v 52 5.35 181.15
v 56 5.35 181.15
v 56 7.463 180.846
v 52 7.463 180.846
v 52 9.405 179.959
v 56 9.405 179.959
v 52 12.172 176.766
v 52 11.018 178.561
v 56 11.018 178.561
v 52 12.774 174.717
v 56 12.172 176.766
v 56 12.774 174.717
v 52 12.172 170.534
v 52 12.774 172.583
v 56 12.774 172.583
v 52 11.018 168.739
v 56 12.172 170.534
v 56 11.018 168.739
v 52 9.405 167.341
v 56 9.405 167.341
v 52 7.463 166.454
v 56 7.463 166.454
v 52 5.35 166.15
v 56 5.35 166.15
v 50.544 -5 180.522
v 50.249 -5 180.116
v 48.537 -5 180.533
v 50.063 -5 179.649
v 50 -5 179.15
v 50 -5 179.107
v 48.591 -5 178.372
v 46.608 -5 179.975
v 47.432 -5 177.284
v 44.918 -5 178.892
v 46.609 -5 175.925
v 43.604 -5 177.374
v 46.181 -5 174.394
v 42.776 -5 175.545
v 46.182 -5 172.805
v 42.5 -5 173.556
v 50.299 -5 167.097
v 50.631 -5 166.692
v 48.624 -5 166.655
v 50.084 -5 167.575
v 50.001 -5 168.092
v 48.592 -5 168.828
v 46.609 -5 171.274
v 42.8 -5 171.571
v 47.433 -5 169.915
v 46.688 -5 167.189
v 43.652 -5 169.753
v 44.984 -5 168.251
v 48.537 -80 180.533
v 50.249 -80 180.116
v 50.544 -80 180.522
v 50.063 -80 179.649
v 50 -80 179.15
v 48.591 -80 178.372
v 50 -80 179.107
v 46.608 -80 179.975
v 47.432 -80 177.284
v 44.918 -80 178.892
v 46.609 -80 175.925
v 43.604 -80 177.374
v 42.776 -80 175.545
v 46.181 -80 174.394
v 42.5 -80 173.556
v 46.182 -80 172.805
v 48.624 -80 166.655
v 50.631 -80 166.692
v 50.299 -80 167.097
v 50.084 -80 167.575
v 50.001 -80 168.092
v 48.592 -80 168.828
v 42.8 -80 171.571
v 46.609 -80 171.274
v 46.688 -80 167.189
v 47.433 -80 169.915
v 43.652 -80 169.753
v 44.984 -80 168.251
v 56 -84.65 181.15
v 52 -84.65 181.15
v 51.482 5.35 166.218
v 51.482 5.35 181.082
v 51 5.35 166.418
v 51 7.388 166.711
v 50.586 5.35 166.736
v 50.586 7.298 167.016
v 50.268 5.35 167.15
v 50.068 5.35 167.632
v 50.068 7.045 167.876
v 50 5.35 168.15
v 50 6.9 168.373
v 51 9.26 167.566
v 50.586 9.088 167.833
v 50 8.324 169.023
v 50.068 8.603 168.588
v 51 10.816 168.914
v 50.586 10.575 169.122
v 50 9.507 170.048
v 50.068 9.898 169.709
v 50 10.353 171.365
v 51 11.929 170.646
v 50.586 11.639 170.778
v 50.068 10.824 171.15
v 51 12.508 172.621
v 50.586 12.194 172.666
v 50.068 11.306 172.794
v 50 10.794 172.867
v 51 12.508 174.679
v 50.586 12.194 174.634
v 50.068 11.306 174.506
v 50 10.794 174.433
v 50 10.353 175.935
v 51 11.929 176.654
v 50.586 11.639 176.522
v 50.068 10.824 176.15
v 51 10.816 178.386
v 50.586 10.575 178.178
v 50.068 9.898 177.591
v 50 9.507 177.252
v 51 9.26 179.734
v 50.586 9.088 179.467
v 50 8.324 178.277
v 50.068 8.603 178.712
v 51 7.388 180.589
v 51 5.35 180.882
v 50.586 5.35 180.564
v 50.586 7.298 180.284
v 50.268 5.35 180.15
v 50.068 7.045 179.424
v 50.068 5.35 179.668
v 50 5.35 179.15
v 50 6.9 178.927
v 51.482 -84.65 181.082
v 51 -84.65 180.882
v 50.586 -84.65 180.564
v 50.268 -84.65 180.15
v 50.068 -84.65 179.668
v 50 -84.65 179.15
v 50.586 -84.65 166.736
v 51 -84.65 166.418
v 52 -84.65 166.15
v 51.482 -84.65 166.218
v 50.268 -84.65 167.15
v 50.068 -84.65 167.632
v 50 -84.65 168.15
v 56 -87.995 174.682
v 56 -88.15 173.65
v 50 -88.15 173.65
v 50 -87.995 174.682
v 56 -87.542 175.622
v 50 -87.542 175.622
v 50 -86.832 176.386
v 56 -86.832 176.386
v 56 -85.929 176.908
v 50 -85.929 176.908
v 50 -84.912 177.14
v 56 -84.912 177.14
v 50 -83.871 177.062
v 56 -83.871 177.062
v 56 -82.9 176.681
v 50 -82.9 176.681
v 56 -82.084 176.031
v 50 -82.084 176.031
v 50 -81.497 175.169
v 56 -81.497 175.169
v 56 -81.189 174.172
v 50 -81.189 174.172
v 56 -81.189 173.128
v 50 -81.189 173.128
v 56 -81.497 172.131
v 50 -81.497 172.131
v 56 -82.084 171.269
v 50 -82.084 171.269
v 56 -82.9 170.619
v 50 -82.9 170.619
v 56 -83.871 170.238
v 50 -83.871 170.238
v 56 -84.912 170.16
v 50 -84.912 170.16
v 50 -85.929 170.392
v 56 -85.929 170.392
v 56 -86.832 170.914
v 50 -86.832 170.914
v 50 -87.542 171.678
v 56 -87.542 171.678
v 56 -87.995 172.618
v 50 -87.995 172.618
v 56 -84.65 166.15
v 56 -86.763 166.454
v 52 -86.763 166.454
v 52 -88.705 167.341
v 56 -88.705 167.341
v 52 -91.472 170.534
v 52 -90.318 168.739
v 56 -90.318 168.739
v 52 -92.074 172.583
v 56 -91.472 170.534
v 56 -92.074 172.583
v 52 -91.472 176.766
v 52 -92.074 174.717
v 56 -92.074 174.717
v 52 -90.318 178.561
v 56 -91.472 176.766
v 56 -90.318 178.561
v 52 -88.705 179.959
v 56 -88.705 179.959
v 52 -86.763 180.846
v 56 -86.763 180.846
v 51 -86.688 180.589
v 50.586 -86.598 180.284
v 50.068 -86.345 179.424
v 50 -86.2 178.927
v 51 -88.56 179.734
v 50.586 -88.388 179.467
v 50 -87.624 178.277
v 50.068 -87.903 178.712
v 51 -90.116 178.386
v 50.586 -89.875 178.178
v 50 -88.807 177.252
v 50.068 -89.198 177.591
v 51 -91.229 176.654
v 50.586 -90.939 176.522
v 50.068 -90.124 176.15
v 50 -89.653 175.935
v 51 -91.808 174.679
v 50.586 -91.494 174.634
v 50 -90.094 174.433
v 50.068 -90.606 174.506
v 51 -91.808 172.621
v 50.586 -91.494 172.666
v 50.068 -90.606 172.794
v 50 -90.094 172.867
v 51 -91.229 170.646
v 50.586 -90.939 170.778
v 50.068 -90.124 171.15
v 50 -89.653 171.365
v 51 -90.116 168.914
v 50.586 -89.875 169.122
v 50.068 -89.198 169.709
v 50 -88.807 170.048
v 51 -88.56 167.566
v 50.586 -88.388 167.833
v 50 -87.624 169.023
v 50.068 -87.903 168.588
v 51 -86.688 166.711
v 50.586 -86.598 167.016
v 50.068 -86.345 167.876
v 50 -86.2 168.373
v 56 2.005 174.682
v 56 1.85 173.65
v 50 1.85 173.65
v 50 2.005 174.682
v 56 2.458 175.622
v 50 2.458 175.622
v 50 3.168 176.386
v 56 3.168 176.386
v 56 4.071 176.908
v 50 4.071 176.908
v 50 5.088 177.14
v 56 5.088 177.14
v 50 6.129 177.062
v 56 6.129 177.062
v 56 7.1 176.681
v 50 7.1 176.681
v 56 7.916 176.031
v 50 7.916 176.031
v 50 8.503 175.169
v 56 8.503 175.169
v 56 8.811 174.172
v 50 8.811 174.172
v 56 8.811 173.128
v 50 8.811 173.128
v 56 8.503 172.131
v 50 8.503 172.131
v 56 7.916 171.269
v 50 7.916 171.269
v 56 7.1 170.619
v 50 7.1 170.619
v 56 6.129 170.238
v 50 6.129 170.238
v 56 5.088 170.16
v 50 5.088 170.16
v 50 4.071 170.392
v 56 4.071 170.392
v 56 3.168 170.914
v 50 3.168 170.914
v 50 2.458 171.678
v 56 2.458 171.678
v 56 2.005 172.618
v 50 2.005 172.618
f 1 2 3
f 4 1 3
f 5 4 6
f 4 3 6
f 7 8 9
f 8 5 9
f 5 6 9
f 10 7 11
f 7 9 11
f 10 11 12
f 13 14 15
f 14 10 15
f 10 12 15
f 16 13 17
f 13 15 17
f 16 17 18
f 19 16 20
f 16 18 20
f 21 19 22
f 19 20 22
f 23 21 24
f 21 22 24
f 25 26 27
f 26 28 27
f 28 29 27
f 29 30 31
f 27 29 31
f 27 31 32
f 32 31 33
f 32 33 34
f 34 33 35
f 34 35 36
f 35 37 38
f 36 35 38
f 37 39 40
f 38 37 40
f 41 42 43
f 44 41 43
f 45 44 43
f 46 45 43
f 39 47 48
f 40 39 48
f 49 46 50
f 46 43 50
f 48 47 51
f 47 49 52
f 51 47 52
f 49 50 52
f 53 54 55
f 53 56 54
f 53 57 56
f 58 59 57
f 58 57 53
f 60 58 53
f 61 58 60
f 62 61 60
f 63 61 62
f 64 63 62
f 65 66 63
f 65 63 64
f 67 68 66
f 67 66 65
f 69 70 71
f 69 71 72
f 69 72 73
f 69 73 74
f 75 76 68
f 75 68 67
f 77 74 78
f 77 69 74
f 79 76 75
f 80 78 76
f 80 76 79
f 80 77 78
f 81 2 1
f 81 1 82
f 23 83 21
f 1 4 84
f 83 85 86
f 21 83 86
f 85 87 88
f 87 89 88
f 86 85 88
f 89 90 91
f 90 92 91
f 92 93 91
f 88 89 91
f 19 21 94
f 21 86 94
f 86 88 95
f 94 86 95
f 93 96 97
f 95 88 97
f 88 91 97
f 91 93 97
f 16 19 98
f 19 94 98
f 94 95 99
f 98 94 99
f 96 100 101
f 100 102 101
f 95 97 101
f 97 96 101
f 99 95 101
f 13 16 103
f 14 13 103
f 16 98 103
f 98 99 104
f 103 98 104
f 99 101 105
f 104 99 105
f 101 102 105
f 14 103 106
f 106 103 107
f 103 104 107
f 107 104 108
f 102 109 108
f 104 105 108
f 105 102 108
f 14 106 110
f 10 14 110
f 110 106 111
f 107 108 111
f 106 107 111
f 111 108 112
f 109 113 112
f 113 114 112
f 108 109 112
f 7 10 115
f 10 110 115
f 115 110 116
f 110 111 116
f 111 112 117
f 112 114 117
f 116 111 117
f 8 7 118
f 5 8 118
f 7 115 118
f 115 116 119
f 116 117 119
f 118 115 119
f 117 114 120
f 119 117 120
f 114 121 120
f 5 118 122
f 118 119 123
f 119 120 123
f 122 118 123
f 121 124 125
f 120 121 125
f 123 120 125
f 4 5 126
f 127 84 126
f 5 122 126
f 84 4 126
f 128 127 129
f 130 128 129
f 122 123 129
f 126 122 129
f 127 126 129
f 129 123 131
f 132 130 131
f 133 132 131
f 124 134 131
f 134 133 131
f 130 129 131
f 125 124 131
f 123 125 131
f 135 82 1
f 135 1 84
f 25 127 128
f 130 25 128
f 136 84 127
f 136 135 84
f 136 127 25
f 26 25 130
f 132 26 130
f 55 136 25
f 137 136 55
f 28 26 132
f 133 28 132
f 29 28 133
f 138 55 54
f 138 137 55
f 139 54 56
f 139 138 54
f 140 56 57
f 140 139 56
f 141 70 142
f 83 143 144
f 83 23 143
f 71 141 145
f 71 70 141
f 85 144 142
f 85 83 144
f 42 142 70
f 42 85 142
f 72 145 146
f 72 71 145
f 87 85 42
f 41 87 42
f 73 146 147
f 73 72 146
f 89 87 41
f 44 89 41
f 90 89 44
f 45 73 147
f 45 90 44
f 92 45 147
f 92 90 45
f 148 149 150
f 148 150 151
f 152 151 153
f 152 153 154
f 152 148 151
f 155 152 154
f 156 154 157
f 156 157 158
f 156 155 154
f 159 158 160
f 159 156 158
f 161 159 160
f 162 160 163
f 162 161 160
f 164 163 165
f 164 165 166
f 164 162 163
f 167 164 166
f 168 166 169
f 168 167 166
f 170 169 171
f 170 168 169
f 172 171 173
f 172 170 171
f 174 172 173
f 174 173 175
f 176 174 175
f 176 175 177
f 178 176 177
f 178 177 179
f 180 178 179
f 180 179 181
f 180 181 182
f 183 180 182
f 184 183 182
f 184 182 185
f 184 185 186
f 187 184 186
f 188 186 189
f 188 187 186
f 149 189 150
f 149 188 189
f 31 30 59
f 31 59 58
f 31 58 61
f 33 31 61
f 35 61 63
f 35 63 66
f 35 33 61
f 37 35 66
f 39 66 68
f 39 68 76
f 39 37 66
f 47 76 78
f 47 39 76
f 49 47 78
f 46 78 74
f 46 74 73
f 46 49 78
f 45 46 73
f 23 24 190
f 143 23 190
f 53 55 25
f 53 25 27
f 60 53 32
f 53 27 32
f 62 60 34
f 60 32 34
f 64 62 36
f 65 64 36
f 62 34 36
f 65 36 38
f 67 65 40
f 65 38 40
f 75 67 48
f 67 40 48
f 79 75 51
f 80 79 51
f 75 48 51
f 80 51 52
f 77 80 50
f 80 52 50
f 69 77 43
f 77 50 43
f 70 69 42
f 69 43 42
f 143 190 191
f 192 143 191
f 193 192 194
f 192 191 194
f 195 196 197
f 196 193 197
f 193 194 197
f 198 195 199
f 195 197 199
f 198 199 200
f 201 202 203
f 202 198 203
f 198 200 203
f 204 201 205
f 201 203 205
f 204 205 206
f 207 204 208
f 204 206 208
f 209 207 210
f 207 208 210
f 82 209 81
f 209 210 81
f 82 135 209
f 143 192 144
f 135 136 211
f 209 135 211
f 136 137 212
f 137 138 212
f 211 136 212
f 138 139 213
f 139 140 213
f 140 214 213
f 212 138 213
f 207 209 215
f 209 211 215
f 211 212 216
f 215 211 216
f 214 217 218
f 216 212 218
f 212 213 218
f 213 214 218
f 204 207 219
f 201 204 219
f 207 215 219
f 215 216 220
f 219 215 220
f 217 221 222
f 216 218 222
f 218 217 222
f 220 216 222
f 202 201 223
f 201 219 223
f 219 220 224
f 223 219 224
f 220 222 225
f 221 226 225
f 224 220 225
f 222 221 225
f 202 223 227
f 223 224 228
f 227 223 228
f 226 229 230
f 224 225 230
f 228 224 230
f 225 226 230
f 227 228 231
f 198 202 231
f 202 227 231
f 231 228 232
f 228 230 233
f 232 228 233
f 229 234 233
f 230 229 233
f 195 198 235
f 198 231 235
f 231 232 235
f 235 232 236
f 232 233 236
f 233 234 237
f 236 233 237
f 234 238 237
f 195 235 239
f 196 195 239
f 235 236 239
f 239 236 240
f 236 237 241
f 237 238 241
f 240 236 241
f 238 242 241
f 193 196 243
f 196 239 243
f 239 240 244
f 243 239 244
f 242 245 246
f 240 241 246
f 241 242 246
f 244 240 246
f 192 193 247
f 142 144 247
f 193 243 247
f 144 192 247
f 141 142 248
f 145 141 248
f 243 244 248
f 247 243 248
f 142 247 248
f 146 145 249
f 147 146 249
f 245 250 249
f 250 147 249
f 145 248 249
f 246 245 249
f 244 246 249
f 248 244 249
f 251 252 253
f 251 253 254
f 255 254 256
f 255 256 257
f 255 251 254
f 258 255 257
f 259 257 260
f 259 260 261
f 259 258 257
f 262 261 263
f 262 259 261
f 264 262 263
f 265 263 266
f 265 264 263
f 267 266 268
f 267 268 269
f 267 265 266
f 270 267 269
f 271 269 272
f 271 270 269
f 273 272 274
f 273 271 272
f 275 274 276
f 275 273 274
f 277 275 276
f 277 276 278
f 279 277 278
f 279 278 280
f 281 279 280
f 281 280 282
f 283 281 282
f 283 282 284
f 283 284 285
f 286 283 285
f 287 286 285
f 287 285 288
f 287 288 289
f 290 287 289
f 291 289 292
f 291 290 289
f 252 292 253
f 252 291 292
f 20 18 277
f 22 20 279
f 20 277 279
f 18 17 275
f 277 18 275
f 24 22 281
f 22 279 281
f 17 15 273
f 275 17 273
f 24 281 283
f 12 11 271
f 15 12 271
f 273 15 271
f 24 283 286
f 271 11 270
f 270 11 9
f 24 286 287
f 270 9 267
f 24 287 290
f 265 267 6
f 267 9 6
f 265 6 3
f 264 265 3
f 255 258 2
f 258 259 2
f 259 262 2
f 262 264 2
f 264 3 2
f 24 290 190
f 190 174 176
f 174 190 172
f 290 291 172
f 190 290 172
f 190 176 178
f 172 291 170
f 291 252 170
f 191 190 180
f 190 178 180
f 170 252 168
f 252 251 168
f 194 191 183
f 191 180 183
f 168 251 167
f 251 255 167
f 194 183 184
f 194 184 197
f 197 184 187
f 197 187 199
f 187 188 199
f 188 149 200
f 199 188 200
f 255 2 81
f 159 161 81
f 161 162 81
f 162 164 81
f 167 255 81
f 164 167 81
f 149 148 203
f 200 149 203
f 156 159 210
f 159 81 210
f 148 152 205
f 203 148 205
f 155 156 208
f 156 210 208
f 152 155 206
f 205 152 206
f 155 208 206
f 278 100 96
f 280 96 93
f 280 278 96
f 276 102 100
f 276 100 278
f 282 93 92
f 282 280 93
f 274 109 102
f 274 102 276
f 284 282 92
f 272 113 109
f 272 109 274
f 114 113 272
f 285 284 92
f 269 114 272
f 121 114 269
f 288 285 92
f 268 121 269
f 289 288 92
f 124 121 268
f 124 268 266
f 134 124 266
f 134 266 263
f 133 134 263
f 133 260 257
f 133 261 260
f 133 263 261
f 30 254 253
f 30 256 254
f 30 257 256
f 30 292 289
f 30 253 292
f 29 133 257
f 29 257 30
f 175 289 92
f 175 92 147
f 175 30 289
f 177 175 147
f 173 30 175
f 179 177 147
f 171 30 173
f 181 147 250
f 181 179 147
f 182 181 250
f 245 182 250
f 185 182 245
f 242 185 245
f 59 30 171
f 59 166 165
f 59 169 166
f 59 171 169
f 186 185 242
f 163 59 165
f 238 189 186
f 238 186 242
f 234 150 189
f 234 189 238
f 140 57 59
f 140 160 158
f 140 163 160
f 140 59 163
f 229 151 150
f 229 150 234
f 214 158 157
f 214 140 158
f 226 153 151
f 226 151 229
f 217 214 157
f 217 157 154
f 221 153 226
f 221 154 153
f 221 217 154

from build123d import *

# Parameters (mm, degrees)
SKETCH010_R                = 3.5
EXTRUDE009_DEPTH           = 6
FILLET001_R                = 2
EXTRUDE023_DEPTH           = 75
EXTRUDE023_PLACEMENT_ANGLE = 180


with BuildPart() as palo_3_hombro:
    # Sketch010 → Extrude009 (new body)
    with BuildSketch(Plane(origin=(0, 0, 0), x_dir=(0, -1, 0), z_dir=(-1, 0, 0))):
        with BuildLine():
            ThreePointArc((0, 7.5), (-7.5, 0), (0, -7.5))
            Line((0, -7.5), (90, -7.5))
            ThreePointArc((90, -7.5), (97.5, 0), (90, 7.5))
            Line((0, 7.5), (90, 7.5))
        make_face()
        Circle(SKETCH010_R, mode=Mode.SUBTRACT)
        with Locations((90, 0)):
            Circle(SKETCH010_R, mode=Mode.SUBTRACT)
    extrude(amount=EXTRUDE009_DEPTH)


with BuildPart() as palo_3_hombro_1:
    # Extrude009 placement: moved
    add(palo_3_hombro.part.moved(Location((60, 5.35, 173.65))))

    # Fillet001
    fillet001_edges = [palo_3_hombro_1.edges().sort_by_distance(p)[0] for p in [
        (54, -39.65, 181.15),
    ]]
    fillet(fillet001_edges, radius=FILLET001_R)


with BuildPart() as fusion028:
    # Sketch024 → Extrude023 (new body)
    with BuildSketch(Plane.XZ):
        with BuildLine():
            ThreePointArc((-4.21383, -5.589601), (7, 0), (-4.21383, 5.589601))
            ThreePointArc((-4.21383, -5.589601), (3.372719, 0), (-4.21383, 5.589601))
        make_face()
    extrude(amount=EXTRUDE023_DEPTH)


with BuildPart() as fusion028_1:
    # Extrude023 placement: moved
    add(fusion028.part.moved(Location((53.5, -5, 173.6))).rotate(Axis((53.5, -5, 173.6), (0, 1, 0)), EXTRUDE023_PLACEMENT_ANGLE))

    # Fusion028: union palo 3 hombro
    add(palo_3_hombro_1.part)


with BuildPart() as fusion028_2:
    # Fusion028 placement: moved
    add(fusion028_1.part.moved(Location((-4, 0, 0))))


solid = fusion028_2.part
